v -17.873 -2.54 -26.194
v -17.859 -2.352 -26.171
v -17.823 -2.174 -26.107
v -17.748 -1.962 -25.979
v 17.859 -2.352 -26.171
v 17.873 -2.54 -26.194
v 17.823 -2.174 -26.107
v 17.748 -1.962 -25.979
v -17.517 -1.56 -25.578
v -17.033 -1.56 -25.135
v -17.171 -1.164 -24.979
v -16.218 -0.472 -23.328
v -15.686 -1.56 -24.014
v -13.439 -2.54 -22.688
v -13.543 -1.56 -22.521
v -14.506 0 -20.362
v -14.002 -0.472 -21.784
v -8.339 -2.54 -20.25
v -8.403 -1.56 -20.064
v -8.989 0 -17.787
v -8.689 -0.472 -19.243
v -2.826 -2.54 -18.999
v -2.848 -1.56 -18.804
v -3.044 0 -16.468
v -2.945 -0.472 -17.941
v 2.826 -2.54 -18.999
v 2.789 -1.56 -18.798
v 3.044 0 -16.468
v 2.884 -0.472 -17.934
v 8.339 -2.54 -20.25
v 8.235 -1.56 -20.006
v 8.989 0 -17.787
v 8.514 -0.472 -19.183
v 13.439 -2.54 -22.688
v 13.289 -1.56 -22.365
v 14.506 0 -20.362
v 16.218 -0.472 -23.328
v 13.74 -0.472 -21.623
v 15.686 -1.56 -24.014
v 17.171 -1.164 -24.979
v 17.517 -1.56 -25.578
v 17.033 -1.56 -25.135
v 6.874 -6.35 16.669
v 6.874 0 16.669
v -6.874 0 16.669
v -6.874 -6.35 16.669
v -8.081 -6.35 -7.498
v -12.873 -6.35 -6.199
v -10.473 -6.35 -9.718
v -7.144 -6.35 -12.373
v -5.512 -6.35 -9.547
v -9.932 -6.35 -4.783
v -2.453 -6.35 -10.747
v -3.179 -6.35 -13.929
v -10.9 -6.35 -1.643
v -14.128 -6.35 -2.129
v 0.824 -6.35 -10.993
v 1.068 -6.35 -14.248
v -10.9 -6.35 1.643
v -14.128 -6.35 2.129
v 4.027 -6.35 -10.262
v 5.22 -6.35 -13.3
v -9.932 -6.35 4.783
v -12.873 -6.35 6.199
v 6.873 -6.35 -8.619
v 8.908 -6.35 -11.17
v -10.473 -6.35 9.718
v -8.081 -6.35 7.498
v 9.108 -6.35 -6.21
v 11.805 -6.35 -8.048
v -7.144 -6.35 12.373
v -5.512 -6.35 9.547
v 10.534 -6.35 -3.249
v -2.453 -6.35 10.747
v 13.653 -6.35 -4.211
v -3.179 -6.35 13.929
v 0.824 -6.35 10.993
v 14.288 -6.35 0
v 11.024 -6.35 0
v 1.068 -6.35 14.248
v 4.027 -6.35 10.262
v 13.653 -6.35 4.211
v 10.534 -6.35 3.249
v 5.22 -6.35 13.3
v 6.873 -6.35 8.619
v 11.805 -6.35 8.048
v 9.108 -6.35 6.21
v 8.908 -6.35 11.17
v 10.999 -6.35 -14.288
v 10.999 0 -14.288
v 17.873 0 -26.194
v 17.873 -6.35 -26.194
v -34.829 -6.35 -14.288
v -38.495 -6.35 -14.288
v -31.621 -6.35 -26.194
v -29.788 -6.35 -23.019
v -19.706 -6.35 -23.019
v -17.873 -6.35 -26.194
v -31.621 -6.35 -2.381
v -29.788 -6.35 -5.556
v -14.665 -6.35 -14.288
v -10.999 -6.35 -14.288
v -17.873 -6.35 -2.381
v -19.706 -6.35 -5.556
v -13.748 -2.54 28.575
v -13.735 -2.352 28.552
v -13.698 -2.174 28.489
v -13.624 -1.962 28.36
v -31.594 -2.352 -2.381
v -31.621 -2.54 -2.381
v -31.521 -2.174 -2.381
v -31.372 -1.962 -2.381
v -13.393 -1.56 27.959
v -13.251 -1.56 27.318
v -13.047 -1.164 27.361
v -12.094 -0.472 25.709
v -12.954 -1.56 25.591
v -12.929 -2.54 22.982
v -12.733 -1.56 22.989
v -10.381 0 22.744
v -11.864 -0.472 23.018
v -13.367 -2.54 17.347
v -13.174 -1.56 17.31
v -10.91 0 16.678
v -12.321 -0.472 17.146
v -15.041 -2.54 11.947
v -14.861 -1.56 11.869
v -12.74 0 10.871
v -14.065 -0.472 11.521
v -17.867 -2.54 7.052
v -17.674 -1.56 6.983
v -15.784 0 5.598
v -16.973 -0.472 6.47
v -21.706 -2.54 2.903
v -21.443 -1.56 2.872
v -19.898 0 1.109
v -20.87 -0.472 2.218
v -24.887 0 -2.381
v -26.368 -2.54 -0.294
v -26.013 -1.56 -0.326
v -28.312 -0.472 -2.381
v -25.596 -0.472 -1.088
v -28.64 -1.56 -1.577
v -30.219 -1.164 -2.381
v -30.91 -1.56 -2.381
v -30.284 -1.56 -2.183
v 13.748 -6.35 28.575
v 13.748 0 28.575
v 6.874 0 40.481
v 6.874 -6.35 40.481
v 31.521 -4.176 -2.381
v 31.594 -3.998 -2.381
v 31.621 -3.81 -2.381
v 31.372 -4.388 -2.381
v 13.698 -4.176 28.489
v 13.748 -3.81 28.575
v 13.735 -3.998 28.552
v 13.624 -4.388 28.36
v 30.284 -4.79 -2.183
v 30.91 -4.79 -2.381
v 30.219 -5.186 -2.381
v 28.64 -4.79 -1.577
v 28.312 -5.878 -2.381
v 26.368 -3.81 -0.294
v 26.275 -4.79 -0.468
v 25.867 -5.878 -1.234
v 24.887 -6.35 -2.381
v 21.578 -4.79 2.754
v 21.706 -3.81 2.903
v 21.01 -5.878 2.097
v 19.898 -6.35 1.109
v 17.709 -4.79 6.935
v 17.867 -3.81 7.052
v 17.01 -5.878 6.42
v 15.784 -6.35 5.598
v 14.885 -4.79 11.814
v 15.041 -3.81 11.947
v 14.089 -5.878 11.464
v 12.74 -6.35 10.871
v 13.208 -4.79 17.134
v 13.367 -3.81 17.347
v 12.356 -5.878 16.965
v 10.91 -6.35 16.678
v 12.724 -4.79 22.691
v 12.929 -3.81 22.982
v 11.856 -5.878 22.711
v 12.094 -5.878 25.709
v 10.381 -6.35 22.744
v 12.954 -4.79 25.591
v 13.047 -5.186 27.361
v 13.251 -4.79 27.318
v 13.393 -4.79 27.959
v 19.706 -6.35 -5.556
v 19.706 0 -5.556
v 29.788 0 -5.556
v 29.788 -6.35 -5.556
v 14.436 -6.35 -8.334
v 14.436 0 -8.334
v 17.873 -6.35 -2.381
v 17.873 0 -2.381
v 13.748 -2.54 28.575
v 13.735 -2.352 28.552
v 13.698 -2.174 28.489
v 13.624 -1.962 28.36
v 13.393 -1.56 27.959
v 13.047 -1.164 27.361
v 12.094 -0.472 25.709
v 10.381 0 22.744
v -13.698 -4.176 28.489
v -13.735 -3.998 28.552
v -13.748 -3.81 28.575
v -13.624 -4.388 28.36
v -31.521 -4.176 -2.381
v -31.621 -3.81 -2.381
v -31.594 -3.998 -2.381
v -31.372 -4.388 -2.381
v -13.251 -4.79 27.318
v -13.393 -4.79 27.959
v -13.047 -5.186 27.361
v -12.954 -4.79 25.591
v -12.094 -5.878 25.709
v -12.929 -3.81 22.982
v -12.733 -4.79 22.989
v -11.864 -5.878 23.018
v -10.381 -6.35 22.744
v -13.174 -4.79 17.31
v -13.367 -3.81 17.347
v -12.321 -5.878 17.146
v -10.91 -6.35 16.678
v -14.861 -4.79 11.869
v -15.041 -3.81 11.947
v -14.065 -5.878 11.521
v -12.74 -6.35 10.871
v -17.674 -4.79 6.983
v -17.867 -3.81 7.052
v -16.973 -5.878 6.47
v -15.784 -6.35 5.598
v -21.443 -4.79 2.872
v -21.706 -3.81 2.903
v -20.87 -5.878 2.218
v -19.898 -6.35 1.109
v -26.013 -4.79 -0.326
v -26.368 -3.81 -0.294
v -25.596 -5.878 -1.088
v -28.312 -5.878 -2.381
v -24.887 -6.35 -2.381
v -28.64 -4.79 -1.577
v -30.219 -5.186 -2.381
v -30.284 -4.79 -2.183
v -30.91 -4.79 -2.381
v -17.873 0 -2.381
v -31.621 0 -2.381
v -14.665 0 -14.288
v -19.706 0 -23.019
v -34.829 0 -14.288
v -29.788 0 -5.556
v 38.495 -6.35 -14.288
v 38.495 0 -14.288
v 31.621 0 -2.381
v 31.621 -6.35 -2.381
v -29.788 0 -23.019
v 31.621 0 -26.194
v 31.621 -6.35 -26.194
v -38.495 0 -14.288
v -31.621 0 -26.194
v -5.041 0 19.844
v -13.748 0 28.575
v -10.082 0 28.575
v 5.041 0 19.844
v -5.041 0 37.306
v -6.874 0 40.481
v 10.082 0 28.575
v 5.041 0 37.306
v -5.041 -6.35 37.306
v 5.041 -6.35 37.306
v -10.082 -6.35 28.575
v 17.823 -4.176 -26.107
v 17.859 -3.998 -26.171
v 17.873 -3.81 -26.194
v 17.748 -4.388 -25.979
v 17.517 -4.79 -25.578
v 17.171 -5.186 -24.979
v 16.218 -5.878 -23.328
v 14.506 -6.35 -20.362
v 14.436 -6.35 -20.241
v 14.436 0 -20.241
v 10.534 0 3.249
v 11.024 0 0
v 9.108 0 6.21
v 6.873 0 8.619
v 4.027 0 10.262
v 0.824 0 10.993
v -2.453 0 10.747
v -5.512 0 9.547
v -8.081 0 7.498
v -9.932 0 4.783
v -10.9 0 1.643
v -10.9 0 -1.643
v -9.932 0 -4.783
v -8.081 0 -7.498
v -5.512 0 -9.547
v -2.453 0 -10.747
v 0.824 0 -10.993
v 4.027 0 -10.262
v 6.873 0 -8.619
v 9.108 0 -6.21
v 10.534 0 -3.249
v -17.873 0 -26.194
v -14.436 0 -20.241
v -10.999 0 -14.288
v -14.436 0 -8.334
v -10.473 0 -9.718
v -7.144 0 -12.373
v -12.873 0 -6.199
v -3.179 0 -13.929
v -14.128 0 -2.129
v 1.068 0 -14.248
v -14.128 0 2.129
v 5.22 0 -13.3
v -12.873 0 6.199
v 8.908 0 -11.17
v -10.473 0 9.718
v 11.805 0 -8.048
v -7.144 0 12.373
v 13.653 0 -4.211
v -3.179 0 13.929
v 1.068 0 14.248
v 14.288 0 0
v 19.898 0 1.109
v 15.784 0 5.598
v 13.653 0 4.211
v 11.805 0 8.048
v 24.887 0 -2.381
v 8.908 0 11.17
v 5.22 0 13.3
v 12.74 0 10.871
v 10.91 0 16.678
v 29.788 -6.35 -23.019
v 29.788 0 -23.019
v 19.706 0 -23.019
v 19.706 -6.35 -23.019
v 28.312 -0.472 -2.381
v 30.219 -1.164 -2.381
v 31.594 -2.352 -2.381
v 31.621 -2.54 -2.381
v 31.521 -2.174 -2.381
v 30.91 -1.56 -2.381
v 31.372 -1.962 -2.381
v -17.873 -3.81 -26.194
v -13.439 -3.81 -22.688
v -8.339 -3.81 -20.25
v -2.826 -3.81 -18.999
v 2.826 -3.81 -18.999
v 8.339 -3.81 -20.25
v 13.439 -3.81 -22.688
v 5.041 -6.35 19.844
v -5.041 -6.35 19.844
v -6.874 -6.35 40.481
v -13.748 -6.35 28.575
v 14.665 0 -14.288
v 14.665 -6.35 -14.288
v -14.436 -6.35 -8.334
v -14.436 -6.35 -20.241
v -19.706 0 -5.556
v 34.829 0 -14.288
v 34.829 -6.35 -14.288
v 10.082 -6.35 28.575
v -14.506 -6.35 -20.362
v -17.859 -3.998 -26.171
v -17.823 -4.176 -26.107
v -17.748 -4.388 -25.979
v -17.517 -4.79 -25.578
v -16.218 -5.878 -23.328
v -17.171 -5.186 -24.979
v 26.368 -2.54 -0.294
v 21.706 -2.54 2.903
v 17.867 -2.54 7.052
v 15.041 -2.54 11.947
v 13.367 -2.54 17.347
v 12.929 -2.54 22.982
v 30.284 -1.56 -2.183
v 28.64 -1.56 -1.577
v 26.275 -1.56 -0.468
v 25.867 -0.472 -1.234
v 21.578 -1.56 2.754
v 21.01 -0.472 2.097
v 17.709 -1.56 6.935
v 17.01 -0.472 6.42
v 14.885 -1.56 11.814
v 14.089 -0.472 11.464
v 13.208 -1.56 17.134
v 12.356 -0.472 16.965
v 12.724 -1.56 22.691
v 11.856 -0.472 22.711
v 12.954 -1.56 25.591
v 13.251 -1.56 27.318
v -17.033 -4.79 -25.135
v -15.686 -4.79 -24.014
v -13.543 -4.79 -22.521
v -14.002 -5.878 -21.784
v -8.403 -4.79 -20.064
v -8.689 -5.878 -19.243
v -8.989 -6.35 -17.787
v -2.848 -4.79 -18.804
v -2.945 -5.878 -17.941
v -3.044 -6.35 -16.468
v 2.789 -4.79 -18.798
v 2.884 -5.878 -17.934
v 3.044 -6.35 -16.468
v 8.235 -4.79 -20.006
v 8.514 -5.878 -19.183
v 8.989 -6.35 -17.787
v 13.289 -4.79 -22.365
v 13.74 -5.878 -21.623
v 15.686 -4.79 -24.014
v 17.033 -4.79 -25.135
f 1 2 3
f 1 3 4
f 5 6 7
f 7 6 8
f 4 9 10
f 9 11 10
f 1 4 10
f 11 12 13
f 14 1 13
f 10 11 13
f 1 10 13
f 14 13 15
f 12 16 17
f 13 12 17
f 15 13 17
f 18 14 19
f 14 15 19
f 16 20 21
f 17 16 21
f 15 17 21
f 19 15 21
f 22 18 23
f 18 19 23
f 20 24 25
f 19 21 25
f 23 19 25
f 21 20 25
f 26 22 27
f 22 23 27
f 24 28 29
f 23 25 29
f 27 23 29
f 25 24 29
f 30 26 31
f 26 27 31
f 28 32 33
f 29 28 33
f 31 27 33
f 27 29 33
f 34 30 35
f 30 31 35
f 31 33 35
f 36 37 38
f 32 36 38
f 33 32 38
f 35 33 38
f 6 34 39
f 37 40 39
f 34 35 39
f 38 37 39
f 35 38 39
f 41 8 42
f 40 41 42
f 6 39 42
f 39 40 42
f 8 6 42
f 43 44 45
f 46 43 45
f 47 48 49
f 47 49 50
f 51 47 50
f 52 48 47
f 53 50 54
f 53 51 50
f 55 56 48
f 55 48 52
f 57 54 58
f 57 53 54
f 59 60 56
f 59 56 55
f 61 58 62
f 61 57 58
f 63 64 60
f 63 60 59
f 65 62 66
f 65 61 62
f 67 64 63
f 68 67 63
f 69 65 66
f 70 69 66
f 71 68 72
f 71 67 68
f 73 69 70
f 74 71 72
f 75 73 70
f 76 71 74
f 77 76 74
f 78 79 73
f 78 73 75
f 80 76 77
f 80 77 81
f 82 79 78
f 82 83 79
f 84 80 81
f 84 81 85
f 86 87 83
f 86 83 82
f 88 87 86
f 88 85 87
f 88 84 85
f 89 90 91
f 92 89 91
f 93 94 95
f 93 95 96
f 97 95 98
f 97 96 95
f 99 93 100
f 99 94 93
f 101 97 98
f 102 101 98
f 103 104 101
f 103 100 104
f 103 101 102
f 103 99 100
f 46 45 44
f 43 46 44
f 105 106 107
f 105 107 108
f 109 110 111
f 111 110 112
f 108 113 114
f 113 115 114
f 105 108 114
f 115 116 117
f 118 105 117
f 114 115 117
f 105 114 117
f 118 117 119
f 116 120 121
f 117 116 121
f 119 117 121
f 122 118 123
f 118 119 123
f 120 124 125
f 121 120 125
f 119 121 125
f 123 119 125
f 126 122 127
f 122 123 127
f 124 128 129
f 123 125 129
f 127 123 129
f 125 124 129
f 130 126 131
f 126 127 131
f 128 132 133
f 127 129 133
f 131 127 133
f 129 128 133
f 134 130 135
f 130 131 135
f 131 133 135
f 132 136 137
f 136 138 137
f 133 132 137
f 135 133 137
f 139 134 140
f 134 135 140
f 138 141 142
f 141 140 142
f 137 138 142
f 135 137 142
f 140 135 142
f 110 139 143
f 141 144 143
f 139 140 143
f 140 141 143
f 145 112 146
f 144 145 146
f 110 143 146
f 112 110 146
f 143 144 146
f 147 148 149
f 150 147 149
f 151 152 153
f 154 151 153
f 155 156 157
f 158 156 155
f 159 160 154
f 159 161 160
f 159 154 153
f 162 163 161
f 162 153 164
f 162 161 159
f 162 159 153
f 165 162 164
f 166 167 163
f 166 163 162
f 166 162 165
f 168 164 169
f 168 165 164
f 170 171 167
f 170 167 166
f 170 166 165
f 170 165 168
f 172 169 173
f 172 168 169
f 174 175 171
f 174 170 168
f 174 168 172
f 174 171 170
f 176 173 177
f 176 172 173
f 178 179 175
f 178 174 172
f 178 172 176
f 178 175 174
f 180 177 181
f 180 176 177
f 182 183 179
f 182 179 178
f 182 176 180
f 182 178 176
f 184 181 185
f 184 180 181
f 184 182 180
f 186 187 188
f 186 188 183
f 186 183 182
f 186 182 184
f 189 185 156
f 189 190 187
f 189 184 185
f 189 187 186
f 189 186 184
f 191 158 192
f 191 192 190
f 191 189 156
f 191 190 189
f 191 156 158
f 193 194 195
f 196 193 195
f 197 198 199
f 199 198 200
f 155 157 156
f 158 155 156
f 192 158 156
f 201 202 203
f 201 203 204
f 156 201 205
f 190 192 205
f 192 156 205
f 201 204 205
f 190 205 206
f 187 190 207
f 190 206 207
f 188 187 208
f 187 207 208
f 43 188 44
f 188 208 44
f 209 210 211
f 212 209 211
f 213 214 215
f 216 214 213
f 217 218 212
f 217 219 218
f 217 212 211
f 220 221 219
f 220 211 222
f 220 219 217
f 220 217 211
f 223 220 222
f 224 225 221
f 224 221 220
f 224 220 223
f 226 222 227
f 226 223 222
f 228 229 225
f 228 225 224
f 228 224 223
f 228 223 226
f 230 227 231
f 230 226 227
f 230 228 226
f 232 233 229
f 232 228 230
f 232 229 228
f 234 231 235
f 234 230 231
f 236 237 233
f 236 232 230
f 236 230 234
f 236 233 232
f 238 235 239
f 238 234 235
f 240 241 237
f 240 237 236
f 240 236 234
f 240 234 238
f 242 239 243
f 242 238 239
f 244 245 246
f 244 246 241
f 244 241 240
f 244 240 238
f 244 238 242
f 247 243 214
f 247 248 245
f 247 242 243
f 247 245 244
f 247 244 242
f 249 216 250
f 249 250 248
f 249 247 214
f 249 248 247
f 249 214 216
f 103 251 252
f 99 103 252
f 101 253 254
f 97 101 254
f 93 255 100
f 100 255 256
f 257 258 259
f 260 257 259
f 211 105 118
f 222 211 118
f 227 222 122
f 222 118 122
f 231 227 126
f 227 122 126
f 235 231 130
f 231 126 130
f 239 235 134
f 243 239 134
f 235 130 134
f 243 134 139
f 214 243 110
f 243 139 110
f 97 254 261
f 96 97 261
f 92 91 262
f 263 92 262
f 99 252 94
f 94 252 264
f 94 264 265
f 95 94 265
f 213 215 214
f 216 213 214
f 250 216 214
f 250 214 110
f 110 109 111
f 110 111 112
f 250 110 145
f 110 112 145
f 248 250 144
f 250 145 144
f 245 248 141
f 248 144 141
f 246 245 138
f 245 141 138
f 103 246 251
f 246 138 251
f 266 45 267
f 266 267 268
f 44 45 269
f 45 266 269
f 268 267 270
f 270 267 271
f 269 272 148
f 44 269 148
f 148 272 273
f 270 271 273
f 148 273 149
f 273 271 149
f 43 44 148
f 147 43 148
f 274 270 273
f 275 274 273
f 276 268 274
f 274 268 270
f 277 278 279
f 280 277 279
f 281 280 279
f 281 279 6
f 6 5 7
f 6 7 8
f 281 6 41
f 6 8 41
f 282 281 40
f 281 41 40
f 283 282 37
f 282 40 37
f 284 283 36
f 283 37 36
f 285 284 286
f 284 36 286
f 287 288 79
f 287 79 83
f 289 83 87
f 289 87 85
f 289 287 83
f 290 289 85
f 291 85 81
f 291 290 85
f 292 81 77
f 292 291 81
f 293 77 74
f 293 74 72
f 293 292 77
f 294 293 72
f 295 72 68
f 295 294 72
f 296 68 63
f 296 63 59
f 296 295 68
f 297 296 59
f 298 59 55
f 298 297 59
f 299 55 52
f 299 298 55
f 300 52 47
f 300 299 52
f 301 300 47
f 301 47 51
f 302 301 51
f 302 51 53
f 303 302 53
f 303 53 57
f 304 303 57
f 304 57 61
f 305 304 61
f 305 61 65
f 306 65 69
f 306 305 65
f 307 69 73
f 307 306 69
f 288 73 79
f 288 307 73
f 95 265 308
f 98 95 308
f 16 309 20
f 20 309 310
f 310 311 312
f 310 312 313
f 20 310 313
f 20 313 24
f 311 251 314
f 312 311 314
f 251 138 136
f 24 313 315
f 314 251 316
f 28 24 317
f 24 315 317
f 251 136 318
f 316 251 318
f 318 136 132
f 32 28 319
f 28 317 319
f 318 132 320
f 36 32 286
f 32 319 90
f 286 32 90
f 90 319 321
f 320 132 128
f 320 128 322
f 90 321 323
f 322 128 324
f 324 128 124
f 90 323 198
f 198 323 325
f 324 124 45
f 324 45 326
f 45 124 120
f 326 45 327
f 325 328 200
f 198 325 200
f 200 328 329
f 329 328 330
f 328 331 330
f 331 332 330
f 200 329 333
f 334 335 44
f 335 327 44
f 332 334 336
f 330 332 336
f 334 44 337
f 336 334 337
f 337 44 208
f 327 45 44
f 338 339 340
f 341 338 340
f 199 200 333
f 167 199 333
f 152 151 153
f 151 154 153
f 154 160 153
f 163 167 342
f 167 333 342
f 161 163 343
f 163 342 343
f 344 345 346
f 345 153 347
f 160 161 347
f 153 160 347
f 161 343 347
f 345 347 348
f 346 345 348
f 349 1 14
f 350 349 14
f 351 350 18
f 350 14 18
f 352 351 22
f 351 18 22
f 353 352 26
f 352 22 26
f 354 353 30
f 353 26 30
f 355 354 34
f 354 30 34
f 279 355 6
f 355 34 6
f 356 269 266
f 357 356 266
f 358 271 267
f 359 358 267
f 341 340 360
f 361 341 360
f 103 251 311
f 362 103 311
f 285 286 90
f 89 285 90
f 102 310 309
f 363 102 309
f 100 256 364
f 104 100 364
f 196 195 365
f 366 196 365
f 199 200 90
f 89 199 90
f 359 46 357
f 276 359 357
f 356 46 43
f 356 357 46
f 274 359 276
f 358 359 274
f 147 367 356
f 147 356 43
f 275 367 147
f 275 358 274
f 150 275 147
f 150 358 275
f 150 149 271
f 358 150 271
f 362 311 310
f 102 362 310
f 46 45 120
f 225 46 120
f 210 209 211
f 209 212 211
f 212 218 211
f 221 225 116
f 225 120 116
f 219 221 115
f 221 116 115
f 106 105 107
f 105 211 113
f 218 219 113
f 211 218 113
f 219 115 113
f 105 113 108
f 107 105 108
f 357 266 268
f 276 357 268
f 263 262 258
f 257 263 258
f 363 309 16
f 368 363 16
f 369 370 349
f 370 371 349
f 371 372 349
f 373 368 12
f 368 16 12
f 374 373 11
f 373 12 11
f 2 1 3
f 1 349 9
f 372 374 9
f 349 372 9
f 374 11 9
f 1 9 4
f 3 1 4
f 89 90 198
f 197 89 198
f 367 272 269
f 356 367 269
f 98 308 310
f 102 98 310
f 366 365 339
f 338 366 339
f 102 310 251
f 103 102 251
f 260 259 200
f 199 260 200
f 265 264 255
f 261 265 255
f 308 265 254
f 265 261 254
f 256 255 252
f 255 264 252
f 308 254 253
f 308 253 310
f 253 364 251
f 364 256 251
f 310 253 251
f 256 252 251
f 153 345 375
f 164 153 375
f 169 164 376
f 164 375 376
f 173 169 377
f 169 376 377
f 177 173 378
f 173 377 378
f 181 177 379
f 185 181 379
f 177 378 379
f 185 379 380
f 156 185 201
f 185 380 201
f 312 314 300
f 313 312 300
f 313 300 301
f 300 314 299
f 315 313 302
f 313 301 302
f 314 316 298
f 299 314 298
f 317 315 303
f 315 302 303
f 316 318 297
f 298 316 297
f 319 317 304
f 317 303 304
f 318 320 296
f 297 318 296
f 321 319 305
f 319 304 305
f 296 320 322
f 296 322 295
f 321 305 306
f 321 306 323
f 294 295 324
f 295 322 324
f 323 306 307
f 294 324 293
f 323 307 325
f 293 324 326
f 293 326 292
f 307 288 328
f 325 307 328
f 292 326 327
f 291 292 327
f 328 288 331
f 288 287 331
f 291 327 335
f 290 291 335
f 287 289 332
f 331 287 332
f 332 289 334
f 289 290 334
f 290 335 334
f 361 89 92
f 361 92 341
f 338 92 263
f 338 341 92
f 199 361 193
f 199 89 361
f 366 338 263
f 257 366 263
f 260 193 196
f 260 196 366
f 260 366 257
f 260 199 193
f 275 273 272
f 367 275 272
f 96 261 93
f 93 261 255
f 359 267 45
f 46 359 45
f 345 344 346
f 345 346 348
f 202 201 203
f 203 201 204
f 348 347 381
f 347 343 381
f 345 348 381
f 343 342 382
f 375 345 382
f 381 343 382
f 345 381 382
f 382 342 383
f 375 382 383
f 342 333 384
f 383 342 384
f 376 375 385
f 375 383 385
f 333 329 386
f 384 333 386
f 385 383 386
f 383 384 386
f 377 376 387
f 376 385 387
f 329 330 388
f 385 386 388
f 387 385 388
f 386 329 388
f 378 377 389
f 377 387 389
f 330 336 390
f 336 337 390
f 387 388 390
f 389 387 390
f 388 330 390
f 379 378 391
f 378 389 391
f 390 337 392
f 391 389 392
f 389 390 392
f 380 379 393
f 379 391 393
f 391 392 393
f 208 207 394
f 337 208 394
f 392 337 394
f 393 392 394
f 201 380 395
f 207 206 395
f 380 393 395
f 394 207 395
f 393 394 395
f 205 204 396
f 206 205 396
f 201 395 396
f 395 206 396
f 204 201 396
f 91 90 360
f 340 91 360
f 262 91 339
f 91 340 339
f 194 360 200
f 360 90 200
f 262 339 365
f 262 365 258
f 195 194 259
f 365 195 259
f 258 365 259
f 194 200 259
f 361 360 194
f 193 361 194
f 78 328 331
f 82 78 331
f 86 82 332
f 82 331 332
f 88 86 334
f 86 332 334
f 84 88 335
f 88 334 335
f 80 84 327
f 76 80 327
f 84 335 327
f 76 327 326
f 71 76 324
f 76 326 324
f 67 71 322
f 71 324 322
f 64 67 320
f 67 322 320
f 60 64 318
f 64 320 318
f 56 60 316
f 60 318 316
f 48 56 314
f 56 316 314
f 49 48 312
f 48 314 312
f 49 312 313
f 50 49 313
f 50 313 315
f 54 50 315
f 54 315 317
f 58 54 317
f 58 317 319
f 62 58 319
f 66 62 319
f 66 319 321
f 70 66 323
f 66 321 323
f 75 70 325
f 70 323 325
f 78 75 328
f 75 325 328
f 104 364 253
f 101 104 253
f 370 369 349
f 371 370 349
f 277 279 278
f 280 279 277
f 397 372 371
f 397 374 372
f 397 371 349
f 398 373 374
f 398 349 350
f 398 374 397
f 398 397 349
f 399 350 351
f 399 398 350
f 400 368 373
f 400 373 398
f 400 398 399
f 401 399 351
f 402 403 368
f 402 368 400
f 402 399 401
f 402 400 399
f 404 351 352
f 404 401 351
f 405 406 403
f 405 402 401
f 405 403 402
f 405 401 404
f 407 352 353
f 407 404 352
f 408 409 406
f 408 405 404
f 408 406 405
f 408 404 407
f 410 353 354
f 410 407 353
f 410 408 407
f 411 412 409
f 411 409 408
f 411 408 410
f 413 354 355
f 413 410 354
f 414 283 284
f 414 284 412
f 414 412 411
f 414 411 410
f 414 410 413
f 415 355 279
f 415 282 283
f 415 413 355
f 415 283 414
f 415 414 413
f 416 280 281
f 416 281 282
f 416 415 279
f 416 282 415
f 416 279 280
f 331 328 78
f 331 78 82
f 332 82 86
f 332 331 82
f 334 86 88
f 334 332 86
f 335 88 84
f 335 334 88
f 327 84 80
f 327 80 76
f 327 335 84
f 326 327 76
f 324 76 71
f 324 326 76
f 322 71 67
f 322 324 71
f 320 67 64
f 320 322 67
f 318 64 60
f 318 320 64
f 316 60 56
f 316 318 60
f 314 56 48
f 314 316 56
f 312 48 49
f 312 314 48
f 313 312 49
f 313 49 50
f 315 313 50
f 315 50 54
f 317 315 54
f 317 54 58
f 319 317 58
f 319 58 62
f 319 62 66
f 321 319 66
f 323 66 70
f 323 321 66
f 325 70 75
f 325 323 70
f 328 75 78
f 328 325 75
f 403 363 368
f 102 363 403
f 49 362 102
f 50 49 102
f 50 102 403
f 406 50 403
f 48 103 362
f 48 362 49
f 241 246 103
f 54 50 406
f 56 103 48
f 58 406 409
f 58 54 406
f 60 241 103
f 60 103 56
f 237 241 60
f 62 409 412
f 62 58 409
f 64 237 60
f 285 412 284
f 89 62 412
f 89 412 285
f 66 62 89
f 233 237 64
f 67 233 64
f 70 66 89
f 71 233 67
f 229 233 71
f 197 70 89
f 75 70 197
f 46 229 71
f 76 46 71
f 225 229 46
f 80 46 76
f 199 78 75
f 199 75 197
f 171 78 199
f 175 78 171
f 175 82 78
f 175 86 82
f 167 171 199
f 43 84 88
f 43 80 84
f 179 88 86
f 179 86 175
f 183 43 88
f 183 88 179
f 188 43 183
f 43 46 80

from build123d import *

# Parameters (mm, degrees)
F1_R     = 14.2875
F2_DEPTH = 6.35
F0_R     = 14.2875
F0_R_2   = 11.0236
F3_R     = 2.54


with BuildPart() as f2:
    # F1 (on Front) → F2 (new body)
    with BuildSketch(Plane.XZ):
        with BuildLine():
            Line((17.8725992706, -2.38125), (24.7466759131, -2.38125))
            Line((24.7466759131, -2.38125), (31.6207525557, -2.38125))
            ThreePointArc((31.6207525557, -2.38125), (16.3174315441, 9.4208734945), (13.7481532851, 28.575))
            Line((13.7481532851, 28.575), (10.3111149612, 22.6218749955))
            Line((10.3111149612, 22.6218749955), (6.8740766425, 16.66875))
            Line((6.8740766425, 16.66875), (0, 16.66875))
            Line((0, 16.66875), (-6.8740766425, 16.66875))
            Line((-6.8740766425, 16.66875), (-10.3111149612, 22.6218749955))
            Line((-10.3111149612, 22.6218749955), (-13.7481532851, 28.575))
            ThreePointArc((-13.7481532851, 28.575), (-16.3174315441, 9.4208734945), (-31.6207525557, -2.38125))
            Line((-31.6207525557, -2.38125), (-24.7466759131, -2.38125))
            Line((-24.7466759131, -2.38125), (-17.8725992706, -2.38125))
            Line((-17.8725992706, -2.38125), (-14.4355609503, -8.3343749983))
            Line((-14.4355609503, -8.3343749983), (-10.9985226281, -14.2875))
            Line((-10.9985226281, -14.2875), (-14.4355610462, -20.2406251678))
            Line((-14.4355610462, -20.2406251678), (-17.8725992706, -26.19375))
            ThreePointArc((-17.8725992706, -26.19375), (0, -18.8417469889), (17.8725992706, -26.19375))
            Line((17.8725992706, -26.19375), (14.4355609031, -20.2406249198))
            Line((14.4355609031, -20.2406249198), (10.9985226281, -14.2875))
            Line((10.9985226281, -14.2875), (14.4355609519, -8.3343749955))
            Line((14.4355609519, -8.3343749955), (17.8725992706, -2.38125))
        make_face()
        Circle(F1_R, mode=Mode.SUBTRACT)
    extrude(amount=F2_DEPTH)

    # F3
    f3_edges = [f2.edges().sort_by_distance(p)[0] for p in [
        (16.317432, -6.35, 9.420873),
        (0, -6.35, -18.841747),
        (0, 0, -18.841747),
        (-16.317432, 0, 9.420873),
        (-16.317432, -6.35, 9.420873),
        (16.317432, 0, 9.420873),
    ]]
    fillet(f3_edges, radius=F3_R)


with BuildPart() as f2b:
    # F0 (on Front) → F2, piece 2 (new body)
    with BuildSketch(Plane.XZ):
        Circle(F0_R)
        Circle(F0_R_2, mode=Mode.SUBTRACT)
    extrude(amount=F2_DEPTH)


with BuildPart() as f2c:
    # F0 (on Front) → F2, piece 3 (new body)
    with BuildSketch(Plane.XZ):
        Polygon((-10.9985226281, -14.2875), (-17.8725992706, -2.38125), (-31.6207525557, -2.38125), (-38.4948291982, -14.2875), (-31.6207525557, -26.19375), (-17.8725992706, -26.19375), align=None)
        Polygon((-14.6646968374, -14.2875), (-19.7056863753, -23.01875), (-29.787665451, -23.01875), (-34.8286549889, -14.2875), (-29.787665451, -5.55625), (-19.7056863753, -5.55625), align=None, mode=Mode.SUBTRACT)
    extrude(amount=F2_DEPTH)


with BuildPart() as f2d:
    # F0 (on Front) → F2, piece 4 (new body)
    with BuildSketch(Plane.XZ):
        Polygon((6.8740766425, 40.48125), (-6.8740766425, 40.48125), (-13.7481532851, 28.575), (-6.8740766425, 16.66875), (6.8740766425, 16.66875), (13.7481532851, 28.575), align=None)
        Polygon((10.0819790757, 28.575), (5.0409895379, 19.84375), (-5.0409895379, 19.84375), (-10.0819790757, 28.575), (-5.0409895379, 37.30625), (5.0409895379, 37.30625), align=None, mode=Mode.SUBTRACT)
    extrude(amount=F2_DEPTH)


with BuildPart() as f2e:
    # F0 (on Front) → F2, piece 5 (new body)
    with BuildSketch(Plane.XZ):
        Polygon((17.8725992706, -2.38125), (10.9985226281, -14.2875), (17.8725992706, -26.19375), (31.6207525557, -26.19375), (38.4948291982, -14.2875), (31.6207525557, -2.38125), align=None)
        Polygon((19.7056863753, -5.55625), (29.787665451, -5.55625), (34.8286549889, -14.2875), (29.787665451, -23.01875), (19.7056863753, -23.01875), (14.6646968374, -14.2875), align=None, mode=Mode.SUBTRACT)
    extrude(amount=F2_DEPTH)


solid = Compound([f2.part, f2b.part, f2c.part, f2d.part, f2e.part])
